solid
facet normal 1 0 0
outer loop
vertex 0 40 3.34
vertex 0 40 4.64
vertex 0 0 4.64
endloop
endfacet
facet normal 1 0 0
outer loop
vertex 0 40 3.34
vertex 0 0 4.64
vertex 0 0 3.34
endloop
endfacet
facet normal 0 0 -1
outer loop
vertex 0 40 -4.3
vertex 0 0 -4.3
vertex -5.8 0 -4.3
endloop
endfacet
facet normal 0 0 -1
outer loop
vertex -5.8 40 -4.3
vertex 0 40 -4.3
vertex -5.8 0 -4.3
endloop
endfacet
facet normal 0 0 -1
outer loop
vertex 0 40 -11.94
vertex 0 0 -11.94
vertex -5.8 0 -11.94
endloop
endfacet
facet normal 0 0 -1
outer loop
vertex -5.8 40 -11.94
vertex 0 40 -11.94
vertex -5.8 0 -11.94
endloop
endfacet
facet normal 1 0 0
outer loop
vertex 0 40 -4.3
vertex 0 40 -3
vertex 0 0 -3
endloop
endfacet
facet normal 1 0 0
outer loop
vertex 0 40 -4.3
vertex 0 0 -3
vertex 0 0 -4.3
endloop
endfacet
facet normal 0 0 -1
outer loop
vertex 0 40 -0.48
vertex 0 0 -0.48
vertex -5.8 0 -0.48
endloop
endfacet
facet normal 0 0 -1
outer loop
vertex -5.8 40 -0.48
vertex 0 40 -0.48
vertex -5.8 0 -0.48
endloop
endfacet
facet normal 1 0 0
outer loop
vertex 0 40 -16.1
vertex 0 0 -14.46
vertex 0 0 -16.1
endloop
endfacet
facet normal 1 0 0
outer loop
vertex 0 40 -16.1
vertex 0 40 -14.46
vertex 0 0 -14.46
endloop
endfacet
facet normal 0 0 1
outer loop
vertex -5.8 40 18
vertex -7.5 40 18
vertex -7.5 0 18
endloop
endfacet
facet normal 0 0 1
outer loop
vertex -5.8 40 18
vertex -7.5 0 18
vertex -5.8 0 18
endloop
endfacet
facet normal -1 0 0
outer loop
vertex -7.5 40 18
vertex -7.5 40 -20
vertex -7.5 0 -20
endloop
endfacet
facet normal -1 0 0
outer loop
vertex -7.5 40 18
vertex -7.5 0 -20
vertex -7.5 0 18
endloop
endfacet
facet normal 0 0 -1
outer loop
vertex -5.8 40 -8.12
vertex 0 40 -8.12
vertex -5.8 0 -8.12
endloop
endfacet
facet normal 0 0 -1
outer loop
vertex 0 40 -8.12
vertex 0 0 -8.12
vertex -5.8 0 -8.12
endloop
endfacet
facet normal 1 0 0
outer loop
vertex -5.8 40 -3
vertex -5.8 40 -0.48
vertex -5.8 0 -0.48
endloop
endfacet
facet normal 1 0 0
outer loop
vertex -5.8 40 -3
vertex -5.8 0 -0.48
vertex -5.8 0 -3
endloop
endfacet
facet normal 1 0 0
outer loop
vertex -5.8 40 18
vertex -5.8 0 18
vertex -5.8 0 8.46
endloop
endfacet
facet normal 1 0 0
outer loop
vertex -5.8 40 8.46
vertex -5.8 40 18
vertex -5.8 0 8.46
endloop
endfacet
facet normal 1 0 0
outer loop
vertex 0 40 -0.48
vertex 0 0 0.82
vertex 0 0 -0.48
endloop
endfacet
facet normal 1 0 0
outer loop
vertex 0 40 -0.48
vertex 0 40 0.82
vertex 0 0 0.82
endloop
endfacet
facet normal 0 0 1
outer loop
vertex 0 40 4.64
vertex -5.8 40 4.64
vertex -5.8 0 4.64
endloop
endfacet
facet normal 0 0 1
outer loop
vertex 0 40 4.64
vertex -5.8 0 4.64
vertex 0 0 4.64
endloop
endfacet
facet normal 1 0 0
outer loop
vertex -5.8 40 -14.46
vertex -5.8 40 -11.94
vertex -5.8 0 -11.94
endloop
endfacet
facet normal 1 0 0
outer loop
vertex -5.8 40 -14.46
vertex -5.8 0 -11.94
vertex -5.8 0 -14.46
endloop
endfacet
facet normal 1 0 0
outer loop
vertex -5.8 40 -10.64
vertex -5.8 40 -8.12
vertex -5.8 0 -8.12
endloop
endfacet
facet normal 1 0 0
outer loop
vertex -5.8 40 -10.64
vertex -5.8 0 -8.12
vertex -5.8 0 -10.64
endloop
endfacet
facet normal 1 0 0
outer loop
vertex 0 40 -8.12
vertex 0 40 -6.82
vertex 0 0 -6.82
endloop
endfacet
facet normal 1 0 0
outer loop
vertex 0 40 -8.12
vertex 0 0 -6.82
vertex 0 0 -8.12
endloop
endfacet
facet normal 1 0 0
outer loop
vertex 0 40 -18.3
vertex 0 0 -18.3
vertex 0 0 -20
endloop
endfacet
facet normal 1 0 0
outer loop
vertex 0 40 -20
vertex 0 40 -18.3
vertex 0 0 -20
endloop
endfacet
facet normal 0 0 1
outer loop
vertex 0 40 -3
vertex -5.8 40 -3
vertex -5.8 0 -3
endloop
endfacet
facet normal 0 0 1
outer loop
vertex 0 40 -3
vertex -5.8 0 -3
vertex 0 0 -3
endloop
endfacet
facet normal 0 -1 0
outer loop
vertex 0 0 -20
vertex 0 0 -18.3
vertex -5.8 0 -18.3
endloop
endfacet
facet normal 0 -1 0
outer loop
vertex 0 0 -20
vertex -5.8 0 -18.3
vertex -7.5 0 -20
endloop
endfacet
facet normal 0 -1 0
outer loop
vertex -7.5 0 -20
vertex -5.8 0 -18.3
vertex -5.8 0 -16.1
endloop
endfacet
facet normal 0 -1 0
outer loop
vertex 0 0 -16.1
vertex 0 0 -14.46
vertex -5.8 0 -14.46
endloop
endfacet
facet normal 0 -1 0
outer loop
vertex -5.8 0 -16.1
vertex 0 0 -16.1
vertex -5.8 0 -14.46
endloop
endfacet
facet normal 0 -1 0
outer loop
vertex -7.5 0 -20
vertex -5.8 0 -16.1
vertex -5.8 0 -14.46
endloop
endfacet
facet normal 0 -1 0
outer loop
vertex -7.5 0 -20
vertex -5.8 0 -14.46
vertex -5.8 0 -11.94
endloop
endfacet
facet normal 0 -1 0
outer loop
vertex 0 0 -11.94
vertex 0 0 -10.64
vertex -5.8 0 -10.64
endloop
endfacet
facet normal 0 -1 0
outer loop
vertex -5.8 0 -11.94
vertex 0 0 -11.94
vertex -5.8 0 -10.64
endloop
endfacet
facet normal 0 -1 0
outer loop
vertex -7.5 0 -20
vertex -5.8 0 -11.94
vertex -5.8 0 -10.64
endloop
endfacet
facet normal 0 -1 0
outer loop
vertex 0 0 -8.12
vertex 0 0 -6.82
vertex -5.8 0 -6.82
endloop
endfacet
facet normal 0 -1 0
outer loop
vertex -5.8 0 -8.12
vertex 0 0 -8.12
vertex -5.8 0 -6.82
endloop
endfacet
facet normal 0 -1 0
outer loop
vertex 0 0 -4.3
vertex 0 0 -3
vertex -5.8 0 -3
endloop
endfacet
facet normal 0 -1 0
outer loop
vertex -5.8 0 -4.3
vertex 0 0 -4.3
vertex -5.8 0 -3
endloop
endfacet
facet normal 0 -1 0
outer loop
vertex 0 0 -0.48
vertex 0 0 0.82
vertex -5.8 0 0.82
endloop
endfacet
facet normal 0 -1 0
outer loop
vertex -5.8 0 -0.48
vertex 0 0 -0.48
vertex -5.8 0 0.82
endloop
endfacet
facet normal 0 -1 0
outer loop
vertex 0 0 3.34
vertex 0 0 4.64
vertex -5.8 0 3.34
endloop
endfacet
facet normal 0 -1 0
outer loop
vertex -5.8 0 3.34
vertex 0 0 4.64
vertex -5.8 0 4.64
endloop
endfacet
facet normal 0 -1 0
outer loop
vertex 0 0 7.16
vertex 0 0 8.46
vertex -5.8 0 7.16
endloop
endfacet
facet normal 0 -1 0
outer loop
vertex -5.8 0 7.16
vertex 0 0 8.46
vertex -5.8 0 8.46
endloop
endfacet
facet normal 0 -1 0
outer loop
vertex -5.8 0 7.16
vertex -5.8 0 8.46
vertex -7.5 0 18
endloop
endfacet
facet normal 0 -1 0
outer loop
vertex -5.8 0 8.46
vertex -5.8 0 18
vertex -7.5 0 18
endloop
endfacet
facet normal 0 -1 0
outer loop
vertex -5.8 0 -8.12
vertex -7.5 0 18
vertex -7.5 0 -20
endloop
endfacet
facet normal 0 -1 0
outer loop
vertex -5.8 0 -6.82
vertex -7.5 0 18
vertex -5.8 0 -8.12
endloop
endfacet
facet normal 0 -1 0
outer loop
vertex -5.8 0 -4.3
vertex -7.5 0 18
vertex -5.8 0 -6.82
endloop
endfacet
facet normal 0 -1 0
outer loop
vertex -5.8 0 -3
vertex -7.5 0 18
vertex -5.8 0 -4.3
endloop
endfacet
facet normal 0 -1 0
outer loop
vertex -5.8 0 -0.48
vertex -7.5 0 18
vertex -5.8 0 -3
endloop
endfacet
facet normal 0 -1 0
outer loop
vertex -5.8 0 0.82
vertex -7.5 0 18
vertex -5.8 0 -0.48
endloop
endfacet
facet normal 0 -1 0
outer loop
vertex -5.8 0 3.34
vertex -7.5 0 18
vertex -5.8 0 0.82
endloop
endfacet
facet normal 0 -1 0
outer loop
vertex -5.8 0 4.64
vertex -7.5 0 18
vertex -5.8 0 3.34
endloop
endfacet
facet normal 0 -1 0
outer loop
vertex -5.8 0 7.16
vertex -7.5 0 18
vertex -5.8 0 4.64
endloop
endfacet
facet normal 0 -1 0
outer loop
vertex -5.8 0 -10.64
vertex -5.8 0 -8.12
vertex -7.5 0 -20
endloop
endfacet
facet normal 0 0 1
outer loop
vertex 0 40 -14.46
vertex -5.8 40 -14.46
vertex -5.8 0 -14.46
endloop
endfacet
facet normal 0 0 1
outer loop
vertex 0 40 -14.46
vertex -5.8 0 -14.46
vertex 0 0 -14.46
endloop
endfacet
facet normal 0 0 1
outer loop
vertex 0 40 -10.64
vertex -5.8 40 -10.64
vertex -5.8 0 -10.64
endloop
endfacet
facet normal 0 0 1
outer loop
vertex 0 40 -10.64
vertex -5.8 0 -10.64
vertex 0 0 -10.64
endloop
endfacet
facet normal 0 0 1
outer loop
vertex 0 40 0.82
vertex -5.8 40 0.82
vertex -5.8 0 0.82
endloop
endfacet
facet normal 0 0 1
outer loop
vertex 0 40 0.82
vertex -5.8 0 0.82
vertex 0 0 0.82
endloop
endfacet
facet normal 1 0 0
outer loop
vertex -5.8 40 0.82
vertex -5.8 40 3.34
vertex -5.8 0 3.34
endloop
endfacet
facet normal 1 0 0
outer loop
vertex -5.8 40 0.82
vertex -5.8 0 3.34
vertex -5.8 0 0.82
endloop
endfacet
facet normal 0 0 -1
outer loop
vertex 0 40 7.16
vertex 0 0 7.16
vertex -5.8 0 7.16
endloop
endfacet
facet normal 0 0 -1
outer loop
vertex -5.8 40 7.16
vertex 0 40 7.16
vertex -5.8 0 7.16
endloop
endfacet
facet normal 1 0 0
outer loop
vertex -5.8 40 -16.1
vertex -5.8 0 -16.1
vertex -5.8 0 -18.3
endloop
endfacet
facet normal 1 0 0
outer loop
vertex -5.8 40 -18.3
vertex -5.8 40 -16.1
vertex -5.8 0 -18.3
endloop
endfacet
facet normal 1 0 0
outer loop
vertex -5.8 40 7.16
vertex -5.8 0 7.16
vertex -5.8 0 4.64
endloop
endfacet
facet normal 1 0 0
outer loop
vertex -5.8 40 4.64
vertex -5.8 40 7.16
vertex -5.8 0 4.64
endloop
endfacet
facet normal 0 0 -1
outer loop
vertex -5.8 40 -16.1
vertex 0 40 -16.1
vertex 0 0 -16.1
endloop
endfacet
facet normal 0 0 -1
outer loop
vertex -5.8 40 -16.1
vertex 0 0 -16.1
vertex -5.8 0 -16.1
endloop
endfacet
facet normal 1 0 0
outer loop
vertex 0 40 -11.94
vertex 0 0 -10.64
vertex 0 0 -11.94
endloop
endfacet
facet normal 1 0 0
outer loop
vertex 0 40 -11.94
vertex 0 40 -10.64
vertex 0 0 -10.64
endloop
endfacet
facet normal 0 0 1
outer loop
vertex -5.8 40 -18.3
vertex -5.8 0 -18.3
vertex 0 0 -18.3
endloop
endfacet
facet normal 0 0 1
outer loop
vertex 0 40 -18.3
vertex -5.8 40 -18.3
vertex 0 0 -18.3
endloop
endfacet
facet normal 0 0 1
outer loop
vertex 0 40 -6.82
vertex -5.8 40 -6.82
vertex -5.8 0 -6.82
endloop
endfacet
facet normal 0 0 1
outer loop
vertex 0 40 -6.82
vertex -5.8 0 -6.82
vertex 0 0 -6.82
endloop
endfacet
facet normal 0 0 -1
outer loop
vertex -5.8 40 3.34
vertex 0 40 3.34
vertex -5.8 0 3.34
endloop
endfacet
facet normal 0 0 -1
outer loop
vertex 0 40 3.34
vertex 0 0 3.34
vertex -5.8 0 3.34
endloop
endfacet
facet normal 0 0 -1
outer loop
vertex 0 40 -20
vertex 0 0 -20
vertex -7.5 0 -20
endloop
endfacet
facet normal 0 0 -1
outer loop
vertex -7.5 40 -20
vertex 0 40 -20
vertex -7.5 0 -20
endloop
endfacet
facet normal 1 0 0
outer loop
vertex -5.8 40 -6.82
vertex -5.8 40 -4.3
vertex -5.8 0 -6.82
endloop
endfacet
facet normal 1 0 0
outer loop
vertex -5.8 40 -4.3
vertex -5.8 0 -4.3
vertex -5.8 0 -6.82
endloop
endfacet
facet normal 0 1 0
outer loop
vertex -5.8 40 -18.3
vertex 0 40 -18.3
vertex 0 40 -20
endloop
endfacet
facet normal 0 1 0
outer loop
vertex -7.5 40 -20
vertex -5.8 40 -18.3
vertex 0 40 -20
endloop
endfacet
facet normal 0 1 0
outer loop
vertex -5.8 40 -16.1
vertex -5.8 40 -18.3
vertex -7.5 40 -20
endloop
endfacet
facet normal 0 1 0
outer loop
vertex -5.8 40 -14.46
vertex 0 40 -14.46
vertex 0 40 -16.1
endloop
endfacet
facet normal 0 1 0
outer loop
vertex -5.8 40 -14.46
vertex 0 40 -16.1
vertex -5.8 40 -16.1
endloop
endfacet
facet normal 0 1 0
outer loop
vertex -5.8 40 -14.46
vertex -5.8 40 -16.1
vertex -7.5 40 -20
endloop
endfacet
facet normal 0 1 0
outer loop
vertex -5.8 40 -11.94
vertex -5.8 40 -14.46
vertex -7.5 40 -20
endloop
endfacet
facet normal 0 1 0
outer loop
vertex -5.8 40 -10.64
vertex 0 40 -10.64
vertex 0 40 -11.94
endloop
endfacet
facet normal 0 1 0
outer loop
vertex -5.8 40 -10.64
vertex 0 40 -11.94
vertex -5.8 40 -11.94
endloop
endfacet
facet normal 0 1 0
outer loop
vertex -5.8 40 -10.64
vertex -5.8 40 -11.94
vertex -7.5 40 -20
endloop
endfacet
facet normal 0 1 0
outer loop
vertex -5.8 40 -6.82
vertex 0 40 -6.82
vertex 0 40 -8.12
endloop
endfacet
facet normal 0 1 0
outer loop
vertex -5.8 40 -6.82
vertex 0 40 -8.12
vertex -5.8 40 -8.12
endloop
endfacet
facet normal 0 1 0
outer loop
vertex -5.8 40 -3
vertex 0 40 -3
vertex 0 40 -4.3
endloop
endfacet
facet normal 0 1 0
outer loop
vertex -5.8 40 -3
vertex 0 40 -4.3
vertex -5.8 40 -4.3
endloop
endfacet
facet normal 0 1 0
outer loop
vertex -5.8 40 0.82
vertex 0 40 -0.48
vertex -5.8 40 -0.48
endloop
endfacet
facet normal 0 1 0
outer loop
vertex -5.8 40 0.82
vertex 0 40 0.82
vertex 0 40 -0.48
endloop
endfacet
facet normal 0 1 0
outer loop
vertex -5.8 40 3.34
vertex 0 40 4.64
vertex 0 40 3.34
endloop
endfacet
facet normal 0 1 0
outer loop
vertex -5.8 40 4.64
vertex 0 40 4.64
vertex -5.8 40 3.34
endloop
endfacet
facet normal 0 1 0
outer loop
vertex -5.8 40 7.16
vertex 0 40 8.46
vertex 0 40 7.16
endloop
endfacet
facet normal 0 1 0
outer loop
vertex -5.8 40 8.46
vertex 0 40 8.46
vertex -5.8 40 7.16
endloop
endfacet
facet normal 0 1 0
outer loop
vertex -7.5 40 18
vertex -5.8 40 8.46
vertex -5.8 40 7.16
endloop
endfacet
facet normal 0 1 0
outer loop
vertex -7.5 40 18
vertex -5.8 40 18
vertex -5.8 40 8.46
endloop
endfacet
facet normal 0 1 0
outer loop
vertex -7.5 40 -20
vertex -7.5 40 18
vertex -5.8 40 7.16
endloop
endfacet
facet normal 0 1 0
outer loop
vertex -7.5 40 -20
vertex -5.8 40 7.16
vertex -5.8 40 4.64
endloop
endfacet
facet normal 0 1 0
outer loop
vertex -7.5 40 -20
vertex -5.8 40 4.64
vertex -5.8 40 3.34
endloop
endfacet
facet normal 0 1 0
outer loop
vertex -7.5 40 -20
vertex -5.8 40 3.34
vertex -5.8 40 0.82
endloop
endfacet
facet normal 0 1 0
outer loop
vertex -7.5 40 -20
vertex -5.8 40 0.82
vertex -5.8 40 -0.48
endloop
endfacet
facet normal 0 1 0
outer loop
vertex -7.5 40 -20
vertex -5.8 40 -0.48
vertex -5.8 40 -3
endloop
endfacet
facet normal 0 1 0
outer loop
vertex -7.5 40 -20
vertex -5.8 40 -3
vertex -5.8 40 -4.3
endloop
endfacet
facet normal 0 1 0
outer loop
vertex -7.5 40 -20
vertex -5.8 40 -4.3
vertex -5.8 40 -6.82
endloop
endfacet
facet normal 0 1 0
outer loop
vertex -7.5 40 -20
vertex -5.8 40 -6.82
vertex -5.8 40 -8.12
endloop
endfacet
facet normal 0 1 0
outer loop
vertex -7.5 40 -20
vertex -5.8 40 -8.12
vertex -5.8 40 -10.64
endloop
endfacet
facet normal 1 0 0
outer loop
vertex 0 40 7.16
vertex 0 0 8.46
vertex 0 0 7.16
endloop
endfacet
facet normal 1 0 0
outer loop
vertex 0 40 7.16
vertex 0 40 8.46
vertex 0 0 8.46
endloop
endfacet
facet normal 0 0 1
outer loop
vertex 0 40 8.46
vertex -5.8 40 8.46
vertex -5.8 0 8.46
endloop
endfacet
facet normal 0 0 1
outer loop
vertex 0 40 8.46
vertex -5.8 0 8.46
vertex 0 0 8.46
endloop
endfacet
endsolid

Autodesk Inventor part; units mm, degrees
ref_plane "YZ Plane" through (0, 0, 0) normal (1, 0, 0) x (0, 1, 0)
ref_plane "XZ Plane" through (0, 0, 0) normal (0, 1, 0) x (-1, 0, 0)
ref_plane "XY Plane" through (0, 0, 0) normal (0, 0, 1) x (1, 0, 0)
sketch "Sketch1" plane through (0, 0, 0) normal (0, 1, 0) x (-1, 0, 0)
  line L0 (-10, -20) -> (10, -20)
  line L1 (10, -20) -> (10, 20)
  line L2 (10, 20) -> (-10, 20)
  line L3 (-10, 20) -> (-10, -20)
  line L4 (-10, -20) -> (10, 20) construction
  line L5 (10, -20) -> (-10, 20) construction
  point P0 (0, 0)
  dimension "d0" = 20
  dimension "d1" = 40
extrude "Extrusion1" add sketch "Sketch1" along normal blind 40
sketch "Sketch2" plane through (0, 0, 0) normal (0, -1, 0) x (1, 0, 0)
  line L0 (10, -20) -> (-10, -20) projected
  line L1 (10, 20) -> (10, -20) projected
  line L2 (-10, 20) -> (10, 20) projected
  line L3 (-10, -20) -> (-10, 20) projected
  line L4 (10, 20) -> (10, -20) projected
  line L5 (10, 18.3) -> (-5.8, 18.3)
  line L6 (-5.8, 18.3) -> (-5.8, 16.1)
  line L7 (-5.8, 16.1) -> (10, 16.1)
  line L8 (10, 16.1) -> (10, 18.3)
  point P0 (0, 0)
  dimension "d4" = 1.7
  dimension "d5" = 4.2
  dimension "d6" = 2.2
extrude "Extrusion2" cut sketch "Sketch2" against normal through all contours L7 L6 L5 L1
mirror "Mirror1" about plane through (0, 0, 0) normal (0, 0, 1) of "Extrusion2"
sketch "Sketch3" plane through (0, 0, 0) normal (0, -1, 0) x (1, 0, 0)
  line L0 (-5.8, -16.1) -> (10, -16.1) projected
  line L1 (10, 16.1) -> (10, -16.1) projected
  line L2 (10, 16.1) -> (-5.8, 16.1) projected
  line L3 (-5.8, 16.1) -> (-5.8, 18.3) projected
  line L4 (-5.8, 18.3) -> (10, 18.3) projected
  line L5 (10, 20) -> (10, 18.3) projected
  line L6 (-10, 20) -> (10, 20) projected
  line L7 (-10, -20) -> (-10, 20) projected
  line L8 (10, -20) -> (-10, -20) projected
  line L9 (10, -18.3) -> (10, -20) projected
  line L10 (10, -18.3) -> (-5.8, -18.3) projected
  line L11 (-5.8, -18.3) -> (-5.8, -16.1) projected
  line L12 (10, 14.8) -> (-5.8, 14.8)
  line L13 (-5.8, 14.8) -> (-5.8, 12.28)
  line L14 (-5.8, 12.28) -> (10, 12.28)
  line L15 (10, 12.28) -> (10, 14.8)
  point P0 (0, 0)
  dimension "d9" = 1.3
  dimension "d10" = 2.52
extrude "Extrusion3" cut sketch "Sketch3" against normal through all contours L14 L13 L12 L1
pattern_linear "Rectangular Pattern1" count 8 spacing 3.82 along (0, 0, -1) of "Extrusion3"
sketch "Sketch4" plane through (-10, 0, -20) normal (-1, 0, 0) x (0, 0, 1)
  line L0 (0, 0) -> (40, 0) projected
  line L1 (40, 0) -> (40, 40) projected
  line L2 (0, 40) -> (40, 40) projected
  line L3 (0, 0) -> (0, 40) projected
  point P0 (20, 0)
extrude "Extrusion4" cut sketch "Sketch4" against normal blind 2.5
sketch "Sketch5" plane through (10, 0, 20) normal (1, 0, 0) x (0, 0, -1)
  line L0 (-7.9901, -7.3422) -> (53.3048, -7.3422)
  line L1 (53.3048, -7.3422) -> (53.3048, 101.8937)
  line L2 (53.3048, 101.8937) -> (-7.9901, 101.8937)
  line L3 (-7.9901, 101.8937) -> (-7.9901, -7.3422)
  point P0 (20, 0)
extrude "Extrusion5" cut sketch "Sketch5" against normal blind 10
sketch "Sketch8" plane through (0, 0, 20) normal (1, 0, 0) x (0, 0, -1)
  line L0 (0, 0) -> (40, 0) projected
  line L1 (0, 40) -> (0, 0) projected
  line L2 (40, 40) -> (0, 40) projected
  line L3 (40, 0) -> (40, 40) projected
  line L4 (0, 0) -> (0, 40) projected
  line L5 (12.84, 0) -> (11.54, 0) projected
  line L6 (0, 40) -> (11.54, 40)
  line L7 (11.54, 40) -> (11.54, 0)
  line L8 (11.54, 0) -> (0, 0)
  line L9 (0, 0) -> (0, 40)
  point P0 (20, 0)
extrude "Extrusion8" cut sketch "Sketch8" against normal up to surface (5.8 mm away) contours L1 L2 L7 L0
sketch "Sketch9" plane through (-5.8, 0, 20) normal (0, 0, 1) x (1, 0, 0)
  line L0 (0, 0) -> (0, 40) projected
  line L1 (-1.7, 40) -> (0, 40) projected
  line L2 (-1.7, 40) -> (-1.7, 0) projected
  line L3 (-1.7, 0) -> (0, 0) projected
  point P0 (5.8, 0)
extrude "Extrusion9" cut sketch "Sketch9" against normal blind 2
properties part number "BMS_Heatsink"
